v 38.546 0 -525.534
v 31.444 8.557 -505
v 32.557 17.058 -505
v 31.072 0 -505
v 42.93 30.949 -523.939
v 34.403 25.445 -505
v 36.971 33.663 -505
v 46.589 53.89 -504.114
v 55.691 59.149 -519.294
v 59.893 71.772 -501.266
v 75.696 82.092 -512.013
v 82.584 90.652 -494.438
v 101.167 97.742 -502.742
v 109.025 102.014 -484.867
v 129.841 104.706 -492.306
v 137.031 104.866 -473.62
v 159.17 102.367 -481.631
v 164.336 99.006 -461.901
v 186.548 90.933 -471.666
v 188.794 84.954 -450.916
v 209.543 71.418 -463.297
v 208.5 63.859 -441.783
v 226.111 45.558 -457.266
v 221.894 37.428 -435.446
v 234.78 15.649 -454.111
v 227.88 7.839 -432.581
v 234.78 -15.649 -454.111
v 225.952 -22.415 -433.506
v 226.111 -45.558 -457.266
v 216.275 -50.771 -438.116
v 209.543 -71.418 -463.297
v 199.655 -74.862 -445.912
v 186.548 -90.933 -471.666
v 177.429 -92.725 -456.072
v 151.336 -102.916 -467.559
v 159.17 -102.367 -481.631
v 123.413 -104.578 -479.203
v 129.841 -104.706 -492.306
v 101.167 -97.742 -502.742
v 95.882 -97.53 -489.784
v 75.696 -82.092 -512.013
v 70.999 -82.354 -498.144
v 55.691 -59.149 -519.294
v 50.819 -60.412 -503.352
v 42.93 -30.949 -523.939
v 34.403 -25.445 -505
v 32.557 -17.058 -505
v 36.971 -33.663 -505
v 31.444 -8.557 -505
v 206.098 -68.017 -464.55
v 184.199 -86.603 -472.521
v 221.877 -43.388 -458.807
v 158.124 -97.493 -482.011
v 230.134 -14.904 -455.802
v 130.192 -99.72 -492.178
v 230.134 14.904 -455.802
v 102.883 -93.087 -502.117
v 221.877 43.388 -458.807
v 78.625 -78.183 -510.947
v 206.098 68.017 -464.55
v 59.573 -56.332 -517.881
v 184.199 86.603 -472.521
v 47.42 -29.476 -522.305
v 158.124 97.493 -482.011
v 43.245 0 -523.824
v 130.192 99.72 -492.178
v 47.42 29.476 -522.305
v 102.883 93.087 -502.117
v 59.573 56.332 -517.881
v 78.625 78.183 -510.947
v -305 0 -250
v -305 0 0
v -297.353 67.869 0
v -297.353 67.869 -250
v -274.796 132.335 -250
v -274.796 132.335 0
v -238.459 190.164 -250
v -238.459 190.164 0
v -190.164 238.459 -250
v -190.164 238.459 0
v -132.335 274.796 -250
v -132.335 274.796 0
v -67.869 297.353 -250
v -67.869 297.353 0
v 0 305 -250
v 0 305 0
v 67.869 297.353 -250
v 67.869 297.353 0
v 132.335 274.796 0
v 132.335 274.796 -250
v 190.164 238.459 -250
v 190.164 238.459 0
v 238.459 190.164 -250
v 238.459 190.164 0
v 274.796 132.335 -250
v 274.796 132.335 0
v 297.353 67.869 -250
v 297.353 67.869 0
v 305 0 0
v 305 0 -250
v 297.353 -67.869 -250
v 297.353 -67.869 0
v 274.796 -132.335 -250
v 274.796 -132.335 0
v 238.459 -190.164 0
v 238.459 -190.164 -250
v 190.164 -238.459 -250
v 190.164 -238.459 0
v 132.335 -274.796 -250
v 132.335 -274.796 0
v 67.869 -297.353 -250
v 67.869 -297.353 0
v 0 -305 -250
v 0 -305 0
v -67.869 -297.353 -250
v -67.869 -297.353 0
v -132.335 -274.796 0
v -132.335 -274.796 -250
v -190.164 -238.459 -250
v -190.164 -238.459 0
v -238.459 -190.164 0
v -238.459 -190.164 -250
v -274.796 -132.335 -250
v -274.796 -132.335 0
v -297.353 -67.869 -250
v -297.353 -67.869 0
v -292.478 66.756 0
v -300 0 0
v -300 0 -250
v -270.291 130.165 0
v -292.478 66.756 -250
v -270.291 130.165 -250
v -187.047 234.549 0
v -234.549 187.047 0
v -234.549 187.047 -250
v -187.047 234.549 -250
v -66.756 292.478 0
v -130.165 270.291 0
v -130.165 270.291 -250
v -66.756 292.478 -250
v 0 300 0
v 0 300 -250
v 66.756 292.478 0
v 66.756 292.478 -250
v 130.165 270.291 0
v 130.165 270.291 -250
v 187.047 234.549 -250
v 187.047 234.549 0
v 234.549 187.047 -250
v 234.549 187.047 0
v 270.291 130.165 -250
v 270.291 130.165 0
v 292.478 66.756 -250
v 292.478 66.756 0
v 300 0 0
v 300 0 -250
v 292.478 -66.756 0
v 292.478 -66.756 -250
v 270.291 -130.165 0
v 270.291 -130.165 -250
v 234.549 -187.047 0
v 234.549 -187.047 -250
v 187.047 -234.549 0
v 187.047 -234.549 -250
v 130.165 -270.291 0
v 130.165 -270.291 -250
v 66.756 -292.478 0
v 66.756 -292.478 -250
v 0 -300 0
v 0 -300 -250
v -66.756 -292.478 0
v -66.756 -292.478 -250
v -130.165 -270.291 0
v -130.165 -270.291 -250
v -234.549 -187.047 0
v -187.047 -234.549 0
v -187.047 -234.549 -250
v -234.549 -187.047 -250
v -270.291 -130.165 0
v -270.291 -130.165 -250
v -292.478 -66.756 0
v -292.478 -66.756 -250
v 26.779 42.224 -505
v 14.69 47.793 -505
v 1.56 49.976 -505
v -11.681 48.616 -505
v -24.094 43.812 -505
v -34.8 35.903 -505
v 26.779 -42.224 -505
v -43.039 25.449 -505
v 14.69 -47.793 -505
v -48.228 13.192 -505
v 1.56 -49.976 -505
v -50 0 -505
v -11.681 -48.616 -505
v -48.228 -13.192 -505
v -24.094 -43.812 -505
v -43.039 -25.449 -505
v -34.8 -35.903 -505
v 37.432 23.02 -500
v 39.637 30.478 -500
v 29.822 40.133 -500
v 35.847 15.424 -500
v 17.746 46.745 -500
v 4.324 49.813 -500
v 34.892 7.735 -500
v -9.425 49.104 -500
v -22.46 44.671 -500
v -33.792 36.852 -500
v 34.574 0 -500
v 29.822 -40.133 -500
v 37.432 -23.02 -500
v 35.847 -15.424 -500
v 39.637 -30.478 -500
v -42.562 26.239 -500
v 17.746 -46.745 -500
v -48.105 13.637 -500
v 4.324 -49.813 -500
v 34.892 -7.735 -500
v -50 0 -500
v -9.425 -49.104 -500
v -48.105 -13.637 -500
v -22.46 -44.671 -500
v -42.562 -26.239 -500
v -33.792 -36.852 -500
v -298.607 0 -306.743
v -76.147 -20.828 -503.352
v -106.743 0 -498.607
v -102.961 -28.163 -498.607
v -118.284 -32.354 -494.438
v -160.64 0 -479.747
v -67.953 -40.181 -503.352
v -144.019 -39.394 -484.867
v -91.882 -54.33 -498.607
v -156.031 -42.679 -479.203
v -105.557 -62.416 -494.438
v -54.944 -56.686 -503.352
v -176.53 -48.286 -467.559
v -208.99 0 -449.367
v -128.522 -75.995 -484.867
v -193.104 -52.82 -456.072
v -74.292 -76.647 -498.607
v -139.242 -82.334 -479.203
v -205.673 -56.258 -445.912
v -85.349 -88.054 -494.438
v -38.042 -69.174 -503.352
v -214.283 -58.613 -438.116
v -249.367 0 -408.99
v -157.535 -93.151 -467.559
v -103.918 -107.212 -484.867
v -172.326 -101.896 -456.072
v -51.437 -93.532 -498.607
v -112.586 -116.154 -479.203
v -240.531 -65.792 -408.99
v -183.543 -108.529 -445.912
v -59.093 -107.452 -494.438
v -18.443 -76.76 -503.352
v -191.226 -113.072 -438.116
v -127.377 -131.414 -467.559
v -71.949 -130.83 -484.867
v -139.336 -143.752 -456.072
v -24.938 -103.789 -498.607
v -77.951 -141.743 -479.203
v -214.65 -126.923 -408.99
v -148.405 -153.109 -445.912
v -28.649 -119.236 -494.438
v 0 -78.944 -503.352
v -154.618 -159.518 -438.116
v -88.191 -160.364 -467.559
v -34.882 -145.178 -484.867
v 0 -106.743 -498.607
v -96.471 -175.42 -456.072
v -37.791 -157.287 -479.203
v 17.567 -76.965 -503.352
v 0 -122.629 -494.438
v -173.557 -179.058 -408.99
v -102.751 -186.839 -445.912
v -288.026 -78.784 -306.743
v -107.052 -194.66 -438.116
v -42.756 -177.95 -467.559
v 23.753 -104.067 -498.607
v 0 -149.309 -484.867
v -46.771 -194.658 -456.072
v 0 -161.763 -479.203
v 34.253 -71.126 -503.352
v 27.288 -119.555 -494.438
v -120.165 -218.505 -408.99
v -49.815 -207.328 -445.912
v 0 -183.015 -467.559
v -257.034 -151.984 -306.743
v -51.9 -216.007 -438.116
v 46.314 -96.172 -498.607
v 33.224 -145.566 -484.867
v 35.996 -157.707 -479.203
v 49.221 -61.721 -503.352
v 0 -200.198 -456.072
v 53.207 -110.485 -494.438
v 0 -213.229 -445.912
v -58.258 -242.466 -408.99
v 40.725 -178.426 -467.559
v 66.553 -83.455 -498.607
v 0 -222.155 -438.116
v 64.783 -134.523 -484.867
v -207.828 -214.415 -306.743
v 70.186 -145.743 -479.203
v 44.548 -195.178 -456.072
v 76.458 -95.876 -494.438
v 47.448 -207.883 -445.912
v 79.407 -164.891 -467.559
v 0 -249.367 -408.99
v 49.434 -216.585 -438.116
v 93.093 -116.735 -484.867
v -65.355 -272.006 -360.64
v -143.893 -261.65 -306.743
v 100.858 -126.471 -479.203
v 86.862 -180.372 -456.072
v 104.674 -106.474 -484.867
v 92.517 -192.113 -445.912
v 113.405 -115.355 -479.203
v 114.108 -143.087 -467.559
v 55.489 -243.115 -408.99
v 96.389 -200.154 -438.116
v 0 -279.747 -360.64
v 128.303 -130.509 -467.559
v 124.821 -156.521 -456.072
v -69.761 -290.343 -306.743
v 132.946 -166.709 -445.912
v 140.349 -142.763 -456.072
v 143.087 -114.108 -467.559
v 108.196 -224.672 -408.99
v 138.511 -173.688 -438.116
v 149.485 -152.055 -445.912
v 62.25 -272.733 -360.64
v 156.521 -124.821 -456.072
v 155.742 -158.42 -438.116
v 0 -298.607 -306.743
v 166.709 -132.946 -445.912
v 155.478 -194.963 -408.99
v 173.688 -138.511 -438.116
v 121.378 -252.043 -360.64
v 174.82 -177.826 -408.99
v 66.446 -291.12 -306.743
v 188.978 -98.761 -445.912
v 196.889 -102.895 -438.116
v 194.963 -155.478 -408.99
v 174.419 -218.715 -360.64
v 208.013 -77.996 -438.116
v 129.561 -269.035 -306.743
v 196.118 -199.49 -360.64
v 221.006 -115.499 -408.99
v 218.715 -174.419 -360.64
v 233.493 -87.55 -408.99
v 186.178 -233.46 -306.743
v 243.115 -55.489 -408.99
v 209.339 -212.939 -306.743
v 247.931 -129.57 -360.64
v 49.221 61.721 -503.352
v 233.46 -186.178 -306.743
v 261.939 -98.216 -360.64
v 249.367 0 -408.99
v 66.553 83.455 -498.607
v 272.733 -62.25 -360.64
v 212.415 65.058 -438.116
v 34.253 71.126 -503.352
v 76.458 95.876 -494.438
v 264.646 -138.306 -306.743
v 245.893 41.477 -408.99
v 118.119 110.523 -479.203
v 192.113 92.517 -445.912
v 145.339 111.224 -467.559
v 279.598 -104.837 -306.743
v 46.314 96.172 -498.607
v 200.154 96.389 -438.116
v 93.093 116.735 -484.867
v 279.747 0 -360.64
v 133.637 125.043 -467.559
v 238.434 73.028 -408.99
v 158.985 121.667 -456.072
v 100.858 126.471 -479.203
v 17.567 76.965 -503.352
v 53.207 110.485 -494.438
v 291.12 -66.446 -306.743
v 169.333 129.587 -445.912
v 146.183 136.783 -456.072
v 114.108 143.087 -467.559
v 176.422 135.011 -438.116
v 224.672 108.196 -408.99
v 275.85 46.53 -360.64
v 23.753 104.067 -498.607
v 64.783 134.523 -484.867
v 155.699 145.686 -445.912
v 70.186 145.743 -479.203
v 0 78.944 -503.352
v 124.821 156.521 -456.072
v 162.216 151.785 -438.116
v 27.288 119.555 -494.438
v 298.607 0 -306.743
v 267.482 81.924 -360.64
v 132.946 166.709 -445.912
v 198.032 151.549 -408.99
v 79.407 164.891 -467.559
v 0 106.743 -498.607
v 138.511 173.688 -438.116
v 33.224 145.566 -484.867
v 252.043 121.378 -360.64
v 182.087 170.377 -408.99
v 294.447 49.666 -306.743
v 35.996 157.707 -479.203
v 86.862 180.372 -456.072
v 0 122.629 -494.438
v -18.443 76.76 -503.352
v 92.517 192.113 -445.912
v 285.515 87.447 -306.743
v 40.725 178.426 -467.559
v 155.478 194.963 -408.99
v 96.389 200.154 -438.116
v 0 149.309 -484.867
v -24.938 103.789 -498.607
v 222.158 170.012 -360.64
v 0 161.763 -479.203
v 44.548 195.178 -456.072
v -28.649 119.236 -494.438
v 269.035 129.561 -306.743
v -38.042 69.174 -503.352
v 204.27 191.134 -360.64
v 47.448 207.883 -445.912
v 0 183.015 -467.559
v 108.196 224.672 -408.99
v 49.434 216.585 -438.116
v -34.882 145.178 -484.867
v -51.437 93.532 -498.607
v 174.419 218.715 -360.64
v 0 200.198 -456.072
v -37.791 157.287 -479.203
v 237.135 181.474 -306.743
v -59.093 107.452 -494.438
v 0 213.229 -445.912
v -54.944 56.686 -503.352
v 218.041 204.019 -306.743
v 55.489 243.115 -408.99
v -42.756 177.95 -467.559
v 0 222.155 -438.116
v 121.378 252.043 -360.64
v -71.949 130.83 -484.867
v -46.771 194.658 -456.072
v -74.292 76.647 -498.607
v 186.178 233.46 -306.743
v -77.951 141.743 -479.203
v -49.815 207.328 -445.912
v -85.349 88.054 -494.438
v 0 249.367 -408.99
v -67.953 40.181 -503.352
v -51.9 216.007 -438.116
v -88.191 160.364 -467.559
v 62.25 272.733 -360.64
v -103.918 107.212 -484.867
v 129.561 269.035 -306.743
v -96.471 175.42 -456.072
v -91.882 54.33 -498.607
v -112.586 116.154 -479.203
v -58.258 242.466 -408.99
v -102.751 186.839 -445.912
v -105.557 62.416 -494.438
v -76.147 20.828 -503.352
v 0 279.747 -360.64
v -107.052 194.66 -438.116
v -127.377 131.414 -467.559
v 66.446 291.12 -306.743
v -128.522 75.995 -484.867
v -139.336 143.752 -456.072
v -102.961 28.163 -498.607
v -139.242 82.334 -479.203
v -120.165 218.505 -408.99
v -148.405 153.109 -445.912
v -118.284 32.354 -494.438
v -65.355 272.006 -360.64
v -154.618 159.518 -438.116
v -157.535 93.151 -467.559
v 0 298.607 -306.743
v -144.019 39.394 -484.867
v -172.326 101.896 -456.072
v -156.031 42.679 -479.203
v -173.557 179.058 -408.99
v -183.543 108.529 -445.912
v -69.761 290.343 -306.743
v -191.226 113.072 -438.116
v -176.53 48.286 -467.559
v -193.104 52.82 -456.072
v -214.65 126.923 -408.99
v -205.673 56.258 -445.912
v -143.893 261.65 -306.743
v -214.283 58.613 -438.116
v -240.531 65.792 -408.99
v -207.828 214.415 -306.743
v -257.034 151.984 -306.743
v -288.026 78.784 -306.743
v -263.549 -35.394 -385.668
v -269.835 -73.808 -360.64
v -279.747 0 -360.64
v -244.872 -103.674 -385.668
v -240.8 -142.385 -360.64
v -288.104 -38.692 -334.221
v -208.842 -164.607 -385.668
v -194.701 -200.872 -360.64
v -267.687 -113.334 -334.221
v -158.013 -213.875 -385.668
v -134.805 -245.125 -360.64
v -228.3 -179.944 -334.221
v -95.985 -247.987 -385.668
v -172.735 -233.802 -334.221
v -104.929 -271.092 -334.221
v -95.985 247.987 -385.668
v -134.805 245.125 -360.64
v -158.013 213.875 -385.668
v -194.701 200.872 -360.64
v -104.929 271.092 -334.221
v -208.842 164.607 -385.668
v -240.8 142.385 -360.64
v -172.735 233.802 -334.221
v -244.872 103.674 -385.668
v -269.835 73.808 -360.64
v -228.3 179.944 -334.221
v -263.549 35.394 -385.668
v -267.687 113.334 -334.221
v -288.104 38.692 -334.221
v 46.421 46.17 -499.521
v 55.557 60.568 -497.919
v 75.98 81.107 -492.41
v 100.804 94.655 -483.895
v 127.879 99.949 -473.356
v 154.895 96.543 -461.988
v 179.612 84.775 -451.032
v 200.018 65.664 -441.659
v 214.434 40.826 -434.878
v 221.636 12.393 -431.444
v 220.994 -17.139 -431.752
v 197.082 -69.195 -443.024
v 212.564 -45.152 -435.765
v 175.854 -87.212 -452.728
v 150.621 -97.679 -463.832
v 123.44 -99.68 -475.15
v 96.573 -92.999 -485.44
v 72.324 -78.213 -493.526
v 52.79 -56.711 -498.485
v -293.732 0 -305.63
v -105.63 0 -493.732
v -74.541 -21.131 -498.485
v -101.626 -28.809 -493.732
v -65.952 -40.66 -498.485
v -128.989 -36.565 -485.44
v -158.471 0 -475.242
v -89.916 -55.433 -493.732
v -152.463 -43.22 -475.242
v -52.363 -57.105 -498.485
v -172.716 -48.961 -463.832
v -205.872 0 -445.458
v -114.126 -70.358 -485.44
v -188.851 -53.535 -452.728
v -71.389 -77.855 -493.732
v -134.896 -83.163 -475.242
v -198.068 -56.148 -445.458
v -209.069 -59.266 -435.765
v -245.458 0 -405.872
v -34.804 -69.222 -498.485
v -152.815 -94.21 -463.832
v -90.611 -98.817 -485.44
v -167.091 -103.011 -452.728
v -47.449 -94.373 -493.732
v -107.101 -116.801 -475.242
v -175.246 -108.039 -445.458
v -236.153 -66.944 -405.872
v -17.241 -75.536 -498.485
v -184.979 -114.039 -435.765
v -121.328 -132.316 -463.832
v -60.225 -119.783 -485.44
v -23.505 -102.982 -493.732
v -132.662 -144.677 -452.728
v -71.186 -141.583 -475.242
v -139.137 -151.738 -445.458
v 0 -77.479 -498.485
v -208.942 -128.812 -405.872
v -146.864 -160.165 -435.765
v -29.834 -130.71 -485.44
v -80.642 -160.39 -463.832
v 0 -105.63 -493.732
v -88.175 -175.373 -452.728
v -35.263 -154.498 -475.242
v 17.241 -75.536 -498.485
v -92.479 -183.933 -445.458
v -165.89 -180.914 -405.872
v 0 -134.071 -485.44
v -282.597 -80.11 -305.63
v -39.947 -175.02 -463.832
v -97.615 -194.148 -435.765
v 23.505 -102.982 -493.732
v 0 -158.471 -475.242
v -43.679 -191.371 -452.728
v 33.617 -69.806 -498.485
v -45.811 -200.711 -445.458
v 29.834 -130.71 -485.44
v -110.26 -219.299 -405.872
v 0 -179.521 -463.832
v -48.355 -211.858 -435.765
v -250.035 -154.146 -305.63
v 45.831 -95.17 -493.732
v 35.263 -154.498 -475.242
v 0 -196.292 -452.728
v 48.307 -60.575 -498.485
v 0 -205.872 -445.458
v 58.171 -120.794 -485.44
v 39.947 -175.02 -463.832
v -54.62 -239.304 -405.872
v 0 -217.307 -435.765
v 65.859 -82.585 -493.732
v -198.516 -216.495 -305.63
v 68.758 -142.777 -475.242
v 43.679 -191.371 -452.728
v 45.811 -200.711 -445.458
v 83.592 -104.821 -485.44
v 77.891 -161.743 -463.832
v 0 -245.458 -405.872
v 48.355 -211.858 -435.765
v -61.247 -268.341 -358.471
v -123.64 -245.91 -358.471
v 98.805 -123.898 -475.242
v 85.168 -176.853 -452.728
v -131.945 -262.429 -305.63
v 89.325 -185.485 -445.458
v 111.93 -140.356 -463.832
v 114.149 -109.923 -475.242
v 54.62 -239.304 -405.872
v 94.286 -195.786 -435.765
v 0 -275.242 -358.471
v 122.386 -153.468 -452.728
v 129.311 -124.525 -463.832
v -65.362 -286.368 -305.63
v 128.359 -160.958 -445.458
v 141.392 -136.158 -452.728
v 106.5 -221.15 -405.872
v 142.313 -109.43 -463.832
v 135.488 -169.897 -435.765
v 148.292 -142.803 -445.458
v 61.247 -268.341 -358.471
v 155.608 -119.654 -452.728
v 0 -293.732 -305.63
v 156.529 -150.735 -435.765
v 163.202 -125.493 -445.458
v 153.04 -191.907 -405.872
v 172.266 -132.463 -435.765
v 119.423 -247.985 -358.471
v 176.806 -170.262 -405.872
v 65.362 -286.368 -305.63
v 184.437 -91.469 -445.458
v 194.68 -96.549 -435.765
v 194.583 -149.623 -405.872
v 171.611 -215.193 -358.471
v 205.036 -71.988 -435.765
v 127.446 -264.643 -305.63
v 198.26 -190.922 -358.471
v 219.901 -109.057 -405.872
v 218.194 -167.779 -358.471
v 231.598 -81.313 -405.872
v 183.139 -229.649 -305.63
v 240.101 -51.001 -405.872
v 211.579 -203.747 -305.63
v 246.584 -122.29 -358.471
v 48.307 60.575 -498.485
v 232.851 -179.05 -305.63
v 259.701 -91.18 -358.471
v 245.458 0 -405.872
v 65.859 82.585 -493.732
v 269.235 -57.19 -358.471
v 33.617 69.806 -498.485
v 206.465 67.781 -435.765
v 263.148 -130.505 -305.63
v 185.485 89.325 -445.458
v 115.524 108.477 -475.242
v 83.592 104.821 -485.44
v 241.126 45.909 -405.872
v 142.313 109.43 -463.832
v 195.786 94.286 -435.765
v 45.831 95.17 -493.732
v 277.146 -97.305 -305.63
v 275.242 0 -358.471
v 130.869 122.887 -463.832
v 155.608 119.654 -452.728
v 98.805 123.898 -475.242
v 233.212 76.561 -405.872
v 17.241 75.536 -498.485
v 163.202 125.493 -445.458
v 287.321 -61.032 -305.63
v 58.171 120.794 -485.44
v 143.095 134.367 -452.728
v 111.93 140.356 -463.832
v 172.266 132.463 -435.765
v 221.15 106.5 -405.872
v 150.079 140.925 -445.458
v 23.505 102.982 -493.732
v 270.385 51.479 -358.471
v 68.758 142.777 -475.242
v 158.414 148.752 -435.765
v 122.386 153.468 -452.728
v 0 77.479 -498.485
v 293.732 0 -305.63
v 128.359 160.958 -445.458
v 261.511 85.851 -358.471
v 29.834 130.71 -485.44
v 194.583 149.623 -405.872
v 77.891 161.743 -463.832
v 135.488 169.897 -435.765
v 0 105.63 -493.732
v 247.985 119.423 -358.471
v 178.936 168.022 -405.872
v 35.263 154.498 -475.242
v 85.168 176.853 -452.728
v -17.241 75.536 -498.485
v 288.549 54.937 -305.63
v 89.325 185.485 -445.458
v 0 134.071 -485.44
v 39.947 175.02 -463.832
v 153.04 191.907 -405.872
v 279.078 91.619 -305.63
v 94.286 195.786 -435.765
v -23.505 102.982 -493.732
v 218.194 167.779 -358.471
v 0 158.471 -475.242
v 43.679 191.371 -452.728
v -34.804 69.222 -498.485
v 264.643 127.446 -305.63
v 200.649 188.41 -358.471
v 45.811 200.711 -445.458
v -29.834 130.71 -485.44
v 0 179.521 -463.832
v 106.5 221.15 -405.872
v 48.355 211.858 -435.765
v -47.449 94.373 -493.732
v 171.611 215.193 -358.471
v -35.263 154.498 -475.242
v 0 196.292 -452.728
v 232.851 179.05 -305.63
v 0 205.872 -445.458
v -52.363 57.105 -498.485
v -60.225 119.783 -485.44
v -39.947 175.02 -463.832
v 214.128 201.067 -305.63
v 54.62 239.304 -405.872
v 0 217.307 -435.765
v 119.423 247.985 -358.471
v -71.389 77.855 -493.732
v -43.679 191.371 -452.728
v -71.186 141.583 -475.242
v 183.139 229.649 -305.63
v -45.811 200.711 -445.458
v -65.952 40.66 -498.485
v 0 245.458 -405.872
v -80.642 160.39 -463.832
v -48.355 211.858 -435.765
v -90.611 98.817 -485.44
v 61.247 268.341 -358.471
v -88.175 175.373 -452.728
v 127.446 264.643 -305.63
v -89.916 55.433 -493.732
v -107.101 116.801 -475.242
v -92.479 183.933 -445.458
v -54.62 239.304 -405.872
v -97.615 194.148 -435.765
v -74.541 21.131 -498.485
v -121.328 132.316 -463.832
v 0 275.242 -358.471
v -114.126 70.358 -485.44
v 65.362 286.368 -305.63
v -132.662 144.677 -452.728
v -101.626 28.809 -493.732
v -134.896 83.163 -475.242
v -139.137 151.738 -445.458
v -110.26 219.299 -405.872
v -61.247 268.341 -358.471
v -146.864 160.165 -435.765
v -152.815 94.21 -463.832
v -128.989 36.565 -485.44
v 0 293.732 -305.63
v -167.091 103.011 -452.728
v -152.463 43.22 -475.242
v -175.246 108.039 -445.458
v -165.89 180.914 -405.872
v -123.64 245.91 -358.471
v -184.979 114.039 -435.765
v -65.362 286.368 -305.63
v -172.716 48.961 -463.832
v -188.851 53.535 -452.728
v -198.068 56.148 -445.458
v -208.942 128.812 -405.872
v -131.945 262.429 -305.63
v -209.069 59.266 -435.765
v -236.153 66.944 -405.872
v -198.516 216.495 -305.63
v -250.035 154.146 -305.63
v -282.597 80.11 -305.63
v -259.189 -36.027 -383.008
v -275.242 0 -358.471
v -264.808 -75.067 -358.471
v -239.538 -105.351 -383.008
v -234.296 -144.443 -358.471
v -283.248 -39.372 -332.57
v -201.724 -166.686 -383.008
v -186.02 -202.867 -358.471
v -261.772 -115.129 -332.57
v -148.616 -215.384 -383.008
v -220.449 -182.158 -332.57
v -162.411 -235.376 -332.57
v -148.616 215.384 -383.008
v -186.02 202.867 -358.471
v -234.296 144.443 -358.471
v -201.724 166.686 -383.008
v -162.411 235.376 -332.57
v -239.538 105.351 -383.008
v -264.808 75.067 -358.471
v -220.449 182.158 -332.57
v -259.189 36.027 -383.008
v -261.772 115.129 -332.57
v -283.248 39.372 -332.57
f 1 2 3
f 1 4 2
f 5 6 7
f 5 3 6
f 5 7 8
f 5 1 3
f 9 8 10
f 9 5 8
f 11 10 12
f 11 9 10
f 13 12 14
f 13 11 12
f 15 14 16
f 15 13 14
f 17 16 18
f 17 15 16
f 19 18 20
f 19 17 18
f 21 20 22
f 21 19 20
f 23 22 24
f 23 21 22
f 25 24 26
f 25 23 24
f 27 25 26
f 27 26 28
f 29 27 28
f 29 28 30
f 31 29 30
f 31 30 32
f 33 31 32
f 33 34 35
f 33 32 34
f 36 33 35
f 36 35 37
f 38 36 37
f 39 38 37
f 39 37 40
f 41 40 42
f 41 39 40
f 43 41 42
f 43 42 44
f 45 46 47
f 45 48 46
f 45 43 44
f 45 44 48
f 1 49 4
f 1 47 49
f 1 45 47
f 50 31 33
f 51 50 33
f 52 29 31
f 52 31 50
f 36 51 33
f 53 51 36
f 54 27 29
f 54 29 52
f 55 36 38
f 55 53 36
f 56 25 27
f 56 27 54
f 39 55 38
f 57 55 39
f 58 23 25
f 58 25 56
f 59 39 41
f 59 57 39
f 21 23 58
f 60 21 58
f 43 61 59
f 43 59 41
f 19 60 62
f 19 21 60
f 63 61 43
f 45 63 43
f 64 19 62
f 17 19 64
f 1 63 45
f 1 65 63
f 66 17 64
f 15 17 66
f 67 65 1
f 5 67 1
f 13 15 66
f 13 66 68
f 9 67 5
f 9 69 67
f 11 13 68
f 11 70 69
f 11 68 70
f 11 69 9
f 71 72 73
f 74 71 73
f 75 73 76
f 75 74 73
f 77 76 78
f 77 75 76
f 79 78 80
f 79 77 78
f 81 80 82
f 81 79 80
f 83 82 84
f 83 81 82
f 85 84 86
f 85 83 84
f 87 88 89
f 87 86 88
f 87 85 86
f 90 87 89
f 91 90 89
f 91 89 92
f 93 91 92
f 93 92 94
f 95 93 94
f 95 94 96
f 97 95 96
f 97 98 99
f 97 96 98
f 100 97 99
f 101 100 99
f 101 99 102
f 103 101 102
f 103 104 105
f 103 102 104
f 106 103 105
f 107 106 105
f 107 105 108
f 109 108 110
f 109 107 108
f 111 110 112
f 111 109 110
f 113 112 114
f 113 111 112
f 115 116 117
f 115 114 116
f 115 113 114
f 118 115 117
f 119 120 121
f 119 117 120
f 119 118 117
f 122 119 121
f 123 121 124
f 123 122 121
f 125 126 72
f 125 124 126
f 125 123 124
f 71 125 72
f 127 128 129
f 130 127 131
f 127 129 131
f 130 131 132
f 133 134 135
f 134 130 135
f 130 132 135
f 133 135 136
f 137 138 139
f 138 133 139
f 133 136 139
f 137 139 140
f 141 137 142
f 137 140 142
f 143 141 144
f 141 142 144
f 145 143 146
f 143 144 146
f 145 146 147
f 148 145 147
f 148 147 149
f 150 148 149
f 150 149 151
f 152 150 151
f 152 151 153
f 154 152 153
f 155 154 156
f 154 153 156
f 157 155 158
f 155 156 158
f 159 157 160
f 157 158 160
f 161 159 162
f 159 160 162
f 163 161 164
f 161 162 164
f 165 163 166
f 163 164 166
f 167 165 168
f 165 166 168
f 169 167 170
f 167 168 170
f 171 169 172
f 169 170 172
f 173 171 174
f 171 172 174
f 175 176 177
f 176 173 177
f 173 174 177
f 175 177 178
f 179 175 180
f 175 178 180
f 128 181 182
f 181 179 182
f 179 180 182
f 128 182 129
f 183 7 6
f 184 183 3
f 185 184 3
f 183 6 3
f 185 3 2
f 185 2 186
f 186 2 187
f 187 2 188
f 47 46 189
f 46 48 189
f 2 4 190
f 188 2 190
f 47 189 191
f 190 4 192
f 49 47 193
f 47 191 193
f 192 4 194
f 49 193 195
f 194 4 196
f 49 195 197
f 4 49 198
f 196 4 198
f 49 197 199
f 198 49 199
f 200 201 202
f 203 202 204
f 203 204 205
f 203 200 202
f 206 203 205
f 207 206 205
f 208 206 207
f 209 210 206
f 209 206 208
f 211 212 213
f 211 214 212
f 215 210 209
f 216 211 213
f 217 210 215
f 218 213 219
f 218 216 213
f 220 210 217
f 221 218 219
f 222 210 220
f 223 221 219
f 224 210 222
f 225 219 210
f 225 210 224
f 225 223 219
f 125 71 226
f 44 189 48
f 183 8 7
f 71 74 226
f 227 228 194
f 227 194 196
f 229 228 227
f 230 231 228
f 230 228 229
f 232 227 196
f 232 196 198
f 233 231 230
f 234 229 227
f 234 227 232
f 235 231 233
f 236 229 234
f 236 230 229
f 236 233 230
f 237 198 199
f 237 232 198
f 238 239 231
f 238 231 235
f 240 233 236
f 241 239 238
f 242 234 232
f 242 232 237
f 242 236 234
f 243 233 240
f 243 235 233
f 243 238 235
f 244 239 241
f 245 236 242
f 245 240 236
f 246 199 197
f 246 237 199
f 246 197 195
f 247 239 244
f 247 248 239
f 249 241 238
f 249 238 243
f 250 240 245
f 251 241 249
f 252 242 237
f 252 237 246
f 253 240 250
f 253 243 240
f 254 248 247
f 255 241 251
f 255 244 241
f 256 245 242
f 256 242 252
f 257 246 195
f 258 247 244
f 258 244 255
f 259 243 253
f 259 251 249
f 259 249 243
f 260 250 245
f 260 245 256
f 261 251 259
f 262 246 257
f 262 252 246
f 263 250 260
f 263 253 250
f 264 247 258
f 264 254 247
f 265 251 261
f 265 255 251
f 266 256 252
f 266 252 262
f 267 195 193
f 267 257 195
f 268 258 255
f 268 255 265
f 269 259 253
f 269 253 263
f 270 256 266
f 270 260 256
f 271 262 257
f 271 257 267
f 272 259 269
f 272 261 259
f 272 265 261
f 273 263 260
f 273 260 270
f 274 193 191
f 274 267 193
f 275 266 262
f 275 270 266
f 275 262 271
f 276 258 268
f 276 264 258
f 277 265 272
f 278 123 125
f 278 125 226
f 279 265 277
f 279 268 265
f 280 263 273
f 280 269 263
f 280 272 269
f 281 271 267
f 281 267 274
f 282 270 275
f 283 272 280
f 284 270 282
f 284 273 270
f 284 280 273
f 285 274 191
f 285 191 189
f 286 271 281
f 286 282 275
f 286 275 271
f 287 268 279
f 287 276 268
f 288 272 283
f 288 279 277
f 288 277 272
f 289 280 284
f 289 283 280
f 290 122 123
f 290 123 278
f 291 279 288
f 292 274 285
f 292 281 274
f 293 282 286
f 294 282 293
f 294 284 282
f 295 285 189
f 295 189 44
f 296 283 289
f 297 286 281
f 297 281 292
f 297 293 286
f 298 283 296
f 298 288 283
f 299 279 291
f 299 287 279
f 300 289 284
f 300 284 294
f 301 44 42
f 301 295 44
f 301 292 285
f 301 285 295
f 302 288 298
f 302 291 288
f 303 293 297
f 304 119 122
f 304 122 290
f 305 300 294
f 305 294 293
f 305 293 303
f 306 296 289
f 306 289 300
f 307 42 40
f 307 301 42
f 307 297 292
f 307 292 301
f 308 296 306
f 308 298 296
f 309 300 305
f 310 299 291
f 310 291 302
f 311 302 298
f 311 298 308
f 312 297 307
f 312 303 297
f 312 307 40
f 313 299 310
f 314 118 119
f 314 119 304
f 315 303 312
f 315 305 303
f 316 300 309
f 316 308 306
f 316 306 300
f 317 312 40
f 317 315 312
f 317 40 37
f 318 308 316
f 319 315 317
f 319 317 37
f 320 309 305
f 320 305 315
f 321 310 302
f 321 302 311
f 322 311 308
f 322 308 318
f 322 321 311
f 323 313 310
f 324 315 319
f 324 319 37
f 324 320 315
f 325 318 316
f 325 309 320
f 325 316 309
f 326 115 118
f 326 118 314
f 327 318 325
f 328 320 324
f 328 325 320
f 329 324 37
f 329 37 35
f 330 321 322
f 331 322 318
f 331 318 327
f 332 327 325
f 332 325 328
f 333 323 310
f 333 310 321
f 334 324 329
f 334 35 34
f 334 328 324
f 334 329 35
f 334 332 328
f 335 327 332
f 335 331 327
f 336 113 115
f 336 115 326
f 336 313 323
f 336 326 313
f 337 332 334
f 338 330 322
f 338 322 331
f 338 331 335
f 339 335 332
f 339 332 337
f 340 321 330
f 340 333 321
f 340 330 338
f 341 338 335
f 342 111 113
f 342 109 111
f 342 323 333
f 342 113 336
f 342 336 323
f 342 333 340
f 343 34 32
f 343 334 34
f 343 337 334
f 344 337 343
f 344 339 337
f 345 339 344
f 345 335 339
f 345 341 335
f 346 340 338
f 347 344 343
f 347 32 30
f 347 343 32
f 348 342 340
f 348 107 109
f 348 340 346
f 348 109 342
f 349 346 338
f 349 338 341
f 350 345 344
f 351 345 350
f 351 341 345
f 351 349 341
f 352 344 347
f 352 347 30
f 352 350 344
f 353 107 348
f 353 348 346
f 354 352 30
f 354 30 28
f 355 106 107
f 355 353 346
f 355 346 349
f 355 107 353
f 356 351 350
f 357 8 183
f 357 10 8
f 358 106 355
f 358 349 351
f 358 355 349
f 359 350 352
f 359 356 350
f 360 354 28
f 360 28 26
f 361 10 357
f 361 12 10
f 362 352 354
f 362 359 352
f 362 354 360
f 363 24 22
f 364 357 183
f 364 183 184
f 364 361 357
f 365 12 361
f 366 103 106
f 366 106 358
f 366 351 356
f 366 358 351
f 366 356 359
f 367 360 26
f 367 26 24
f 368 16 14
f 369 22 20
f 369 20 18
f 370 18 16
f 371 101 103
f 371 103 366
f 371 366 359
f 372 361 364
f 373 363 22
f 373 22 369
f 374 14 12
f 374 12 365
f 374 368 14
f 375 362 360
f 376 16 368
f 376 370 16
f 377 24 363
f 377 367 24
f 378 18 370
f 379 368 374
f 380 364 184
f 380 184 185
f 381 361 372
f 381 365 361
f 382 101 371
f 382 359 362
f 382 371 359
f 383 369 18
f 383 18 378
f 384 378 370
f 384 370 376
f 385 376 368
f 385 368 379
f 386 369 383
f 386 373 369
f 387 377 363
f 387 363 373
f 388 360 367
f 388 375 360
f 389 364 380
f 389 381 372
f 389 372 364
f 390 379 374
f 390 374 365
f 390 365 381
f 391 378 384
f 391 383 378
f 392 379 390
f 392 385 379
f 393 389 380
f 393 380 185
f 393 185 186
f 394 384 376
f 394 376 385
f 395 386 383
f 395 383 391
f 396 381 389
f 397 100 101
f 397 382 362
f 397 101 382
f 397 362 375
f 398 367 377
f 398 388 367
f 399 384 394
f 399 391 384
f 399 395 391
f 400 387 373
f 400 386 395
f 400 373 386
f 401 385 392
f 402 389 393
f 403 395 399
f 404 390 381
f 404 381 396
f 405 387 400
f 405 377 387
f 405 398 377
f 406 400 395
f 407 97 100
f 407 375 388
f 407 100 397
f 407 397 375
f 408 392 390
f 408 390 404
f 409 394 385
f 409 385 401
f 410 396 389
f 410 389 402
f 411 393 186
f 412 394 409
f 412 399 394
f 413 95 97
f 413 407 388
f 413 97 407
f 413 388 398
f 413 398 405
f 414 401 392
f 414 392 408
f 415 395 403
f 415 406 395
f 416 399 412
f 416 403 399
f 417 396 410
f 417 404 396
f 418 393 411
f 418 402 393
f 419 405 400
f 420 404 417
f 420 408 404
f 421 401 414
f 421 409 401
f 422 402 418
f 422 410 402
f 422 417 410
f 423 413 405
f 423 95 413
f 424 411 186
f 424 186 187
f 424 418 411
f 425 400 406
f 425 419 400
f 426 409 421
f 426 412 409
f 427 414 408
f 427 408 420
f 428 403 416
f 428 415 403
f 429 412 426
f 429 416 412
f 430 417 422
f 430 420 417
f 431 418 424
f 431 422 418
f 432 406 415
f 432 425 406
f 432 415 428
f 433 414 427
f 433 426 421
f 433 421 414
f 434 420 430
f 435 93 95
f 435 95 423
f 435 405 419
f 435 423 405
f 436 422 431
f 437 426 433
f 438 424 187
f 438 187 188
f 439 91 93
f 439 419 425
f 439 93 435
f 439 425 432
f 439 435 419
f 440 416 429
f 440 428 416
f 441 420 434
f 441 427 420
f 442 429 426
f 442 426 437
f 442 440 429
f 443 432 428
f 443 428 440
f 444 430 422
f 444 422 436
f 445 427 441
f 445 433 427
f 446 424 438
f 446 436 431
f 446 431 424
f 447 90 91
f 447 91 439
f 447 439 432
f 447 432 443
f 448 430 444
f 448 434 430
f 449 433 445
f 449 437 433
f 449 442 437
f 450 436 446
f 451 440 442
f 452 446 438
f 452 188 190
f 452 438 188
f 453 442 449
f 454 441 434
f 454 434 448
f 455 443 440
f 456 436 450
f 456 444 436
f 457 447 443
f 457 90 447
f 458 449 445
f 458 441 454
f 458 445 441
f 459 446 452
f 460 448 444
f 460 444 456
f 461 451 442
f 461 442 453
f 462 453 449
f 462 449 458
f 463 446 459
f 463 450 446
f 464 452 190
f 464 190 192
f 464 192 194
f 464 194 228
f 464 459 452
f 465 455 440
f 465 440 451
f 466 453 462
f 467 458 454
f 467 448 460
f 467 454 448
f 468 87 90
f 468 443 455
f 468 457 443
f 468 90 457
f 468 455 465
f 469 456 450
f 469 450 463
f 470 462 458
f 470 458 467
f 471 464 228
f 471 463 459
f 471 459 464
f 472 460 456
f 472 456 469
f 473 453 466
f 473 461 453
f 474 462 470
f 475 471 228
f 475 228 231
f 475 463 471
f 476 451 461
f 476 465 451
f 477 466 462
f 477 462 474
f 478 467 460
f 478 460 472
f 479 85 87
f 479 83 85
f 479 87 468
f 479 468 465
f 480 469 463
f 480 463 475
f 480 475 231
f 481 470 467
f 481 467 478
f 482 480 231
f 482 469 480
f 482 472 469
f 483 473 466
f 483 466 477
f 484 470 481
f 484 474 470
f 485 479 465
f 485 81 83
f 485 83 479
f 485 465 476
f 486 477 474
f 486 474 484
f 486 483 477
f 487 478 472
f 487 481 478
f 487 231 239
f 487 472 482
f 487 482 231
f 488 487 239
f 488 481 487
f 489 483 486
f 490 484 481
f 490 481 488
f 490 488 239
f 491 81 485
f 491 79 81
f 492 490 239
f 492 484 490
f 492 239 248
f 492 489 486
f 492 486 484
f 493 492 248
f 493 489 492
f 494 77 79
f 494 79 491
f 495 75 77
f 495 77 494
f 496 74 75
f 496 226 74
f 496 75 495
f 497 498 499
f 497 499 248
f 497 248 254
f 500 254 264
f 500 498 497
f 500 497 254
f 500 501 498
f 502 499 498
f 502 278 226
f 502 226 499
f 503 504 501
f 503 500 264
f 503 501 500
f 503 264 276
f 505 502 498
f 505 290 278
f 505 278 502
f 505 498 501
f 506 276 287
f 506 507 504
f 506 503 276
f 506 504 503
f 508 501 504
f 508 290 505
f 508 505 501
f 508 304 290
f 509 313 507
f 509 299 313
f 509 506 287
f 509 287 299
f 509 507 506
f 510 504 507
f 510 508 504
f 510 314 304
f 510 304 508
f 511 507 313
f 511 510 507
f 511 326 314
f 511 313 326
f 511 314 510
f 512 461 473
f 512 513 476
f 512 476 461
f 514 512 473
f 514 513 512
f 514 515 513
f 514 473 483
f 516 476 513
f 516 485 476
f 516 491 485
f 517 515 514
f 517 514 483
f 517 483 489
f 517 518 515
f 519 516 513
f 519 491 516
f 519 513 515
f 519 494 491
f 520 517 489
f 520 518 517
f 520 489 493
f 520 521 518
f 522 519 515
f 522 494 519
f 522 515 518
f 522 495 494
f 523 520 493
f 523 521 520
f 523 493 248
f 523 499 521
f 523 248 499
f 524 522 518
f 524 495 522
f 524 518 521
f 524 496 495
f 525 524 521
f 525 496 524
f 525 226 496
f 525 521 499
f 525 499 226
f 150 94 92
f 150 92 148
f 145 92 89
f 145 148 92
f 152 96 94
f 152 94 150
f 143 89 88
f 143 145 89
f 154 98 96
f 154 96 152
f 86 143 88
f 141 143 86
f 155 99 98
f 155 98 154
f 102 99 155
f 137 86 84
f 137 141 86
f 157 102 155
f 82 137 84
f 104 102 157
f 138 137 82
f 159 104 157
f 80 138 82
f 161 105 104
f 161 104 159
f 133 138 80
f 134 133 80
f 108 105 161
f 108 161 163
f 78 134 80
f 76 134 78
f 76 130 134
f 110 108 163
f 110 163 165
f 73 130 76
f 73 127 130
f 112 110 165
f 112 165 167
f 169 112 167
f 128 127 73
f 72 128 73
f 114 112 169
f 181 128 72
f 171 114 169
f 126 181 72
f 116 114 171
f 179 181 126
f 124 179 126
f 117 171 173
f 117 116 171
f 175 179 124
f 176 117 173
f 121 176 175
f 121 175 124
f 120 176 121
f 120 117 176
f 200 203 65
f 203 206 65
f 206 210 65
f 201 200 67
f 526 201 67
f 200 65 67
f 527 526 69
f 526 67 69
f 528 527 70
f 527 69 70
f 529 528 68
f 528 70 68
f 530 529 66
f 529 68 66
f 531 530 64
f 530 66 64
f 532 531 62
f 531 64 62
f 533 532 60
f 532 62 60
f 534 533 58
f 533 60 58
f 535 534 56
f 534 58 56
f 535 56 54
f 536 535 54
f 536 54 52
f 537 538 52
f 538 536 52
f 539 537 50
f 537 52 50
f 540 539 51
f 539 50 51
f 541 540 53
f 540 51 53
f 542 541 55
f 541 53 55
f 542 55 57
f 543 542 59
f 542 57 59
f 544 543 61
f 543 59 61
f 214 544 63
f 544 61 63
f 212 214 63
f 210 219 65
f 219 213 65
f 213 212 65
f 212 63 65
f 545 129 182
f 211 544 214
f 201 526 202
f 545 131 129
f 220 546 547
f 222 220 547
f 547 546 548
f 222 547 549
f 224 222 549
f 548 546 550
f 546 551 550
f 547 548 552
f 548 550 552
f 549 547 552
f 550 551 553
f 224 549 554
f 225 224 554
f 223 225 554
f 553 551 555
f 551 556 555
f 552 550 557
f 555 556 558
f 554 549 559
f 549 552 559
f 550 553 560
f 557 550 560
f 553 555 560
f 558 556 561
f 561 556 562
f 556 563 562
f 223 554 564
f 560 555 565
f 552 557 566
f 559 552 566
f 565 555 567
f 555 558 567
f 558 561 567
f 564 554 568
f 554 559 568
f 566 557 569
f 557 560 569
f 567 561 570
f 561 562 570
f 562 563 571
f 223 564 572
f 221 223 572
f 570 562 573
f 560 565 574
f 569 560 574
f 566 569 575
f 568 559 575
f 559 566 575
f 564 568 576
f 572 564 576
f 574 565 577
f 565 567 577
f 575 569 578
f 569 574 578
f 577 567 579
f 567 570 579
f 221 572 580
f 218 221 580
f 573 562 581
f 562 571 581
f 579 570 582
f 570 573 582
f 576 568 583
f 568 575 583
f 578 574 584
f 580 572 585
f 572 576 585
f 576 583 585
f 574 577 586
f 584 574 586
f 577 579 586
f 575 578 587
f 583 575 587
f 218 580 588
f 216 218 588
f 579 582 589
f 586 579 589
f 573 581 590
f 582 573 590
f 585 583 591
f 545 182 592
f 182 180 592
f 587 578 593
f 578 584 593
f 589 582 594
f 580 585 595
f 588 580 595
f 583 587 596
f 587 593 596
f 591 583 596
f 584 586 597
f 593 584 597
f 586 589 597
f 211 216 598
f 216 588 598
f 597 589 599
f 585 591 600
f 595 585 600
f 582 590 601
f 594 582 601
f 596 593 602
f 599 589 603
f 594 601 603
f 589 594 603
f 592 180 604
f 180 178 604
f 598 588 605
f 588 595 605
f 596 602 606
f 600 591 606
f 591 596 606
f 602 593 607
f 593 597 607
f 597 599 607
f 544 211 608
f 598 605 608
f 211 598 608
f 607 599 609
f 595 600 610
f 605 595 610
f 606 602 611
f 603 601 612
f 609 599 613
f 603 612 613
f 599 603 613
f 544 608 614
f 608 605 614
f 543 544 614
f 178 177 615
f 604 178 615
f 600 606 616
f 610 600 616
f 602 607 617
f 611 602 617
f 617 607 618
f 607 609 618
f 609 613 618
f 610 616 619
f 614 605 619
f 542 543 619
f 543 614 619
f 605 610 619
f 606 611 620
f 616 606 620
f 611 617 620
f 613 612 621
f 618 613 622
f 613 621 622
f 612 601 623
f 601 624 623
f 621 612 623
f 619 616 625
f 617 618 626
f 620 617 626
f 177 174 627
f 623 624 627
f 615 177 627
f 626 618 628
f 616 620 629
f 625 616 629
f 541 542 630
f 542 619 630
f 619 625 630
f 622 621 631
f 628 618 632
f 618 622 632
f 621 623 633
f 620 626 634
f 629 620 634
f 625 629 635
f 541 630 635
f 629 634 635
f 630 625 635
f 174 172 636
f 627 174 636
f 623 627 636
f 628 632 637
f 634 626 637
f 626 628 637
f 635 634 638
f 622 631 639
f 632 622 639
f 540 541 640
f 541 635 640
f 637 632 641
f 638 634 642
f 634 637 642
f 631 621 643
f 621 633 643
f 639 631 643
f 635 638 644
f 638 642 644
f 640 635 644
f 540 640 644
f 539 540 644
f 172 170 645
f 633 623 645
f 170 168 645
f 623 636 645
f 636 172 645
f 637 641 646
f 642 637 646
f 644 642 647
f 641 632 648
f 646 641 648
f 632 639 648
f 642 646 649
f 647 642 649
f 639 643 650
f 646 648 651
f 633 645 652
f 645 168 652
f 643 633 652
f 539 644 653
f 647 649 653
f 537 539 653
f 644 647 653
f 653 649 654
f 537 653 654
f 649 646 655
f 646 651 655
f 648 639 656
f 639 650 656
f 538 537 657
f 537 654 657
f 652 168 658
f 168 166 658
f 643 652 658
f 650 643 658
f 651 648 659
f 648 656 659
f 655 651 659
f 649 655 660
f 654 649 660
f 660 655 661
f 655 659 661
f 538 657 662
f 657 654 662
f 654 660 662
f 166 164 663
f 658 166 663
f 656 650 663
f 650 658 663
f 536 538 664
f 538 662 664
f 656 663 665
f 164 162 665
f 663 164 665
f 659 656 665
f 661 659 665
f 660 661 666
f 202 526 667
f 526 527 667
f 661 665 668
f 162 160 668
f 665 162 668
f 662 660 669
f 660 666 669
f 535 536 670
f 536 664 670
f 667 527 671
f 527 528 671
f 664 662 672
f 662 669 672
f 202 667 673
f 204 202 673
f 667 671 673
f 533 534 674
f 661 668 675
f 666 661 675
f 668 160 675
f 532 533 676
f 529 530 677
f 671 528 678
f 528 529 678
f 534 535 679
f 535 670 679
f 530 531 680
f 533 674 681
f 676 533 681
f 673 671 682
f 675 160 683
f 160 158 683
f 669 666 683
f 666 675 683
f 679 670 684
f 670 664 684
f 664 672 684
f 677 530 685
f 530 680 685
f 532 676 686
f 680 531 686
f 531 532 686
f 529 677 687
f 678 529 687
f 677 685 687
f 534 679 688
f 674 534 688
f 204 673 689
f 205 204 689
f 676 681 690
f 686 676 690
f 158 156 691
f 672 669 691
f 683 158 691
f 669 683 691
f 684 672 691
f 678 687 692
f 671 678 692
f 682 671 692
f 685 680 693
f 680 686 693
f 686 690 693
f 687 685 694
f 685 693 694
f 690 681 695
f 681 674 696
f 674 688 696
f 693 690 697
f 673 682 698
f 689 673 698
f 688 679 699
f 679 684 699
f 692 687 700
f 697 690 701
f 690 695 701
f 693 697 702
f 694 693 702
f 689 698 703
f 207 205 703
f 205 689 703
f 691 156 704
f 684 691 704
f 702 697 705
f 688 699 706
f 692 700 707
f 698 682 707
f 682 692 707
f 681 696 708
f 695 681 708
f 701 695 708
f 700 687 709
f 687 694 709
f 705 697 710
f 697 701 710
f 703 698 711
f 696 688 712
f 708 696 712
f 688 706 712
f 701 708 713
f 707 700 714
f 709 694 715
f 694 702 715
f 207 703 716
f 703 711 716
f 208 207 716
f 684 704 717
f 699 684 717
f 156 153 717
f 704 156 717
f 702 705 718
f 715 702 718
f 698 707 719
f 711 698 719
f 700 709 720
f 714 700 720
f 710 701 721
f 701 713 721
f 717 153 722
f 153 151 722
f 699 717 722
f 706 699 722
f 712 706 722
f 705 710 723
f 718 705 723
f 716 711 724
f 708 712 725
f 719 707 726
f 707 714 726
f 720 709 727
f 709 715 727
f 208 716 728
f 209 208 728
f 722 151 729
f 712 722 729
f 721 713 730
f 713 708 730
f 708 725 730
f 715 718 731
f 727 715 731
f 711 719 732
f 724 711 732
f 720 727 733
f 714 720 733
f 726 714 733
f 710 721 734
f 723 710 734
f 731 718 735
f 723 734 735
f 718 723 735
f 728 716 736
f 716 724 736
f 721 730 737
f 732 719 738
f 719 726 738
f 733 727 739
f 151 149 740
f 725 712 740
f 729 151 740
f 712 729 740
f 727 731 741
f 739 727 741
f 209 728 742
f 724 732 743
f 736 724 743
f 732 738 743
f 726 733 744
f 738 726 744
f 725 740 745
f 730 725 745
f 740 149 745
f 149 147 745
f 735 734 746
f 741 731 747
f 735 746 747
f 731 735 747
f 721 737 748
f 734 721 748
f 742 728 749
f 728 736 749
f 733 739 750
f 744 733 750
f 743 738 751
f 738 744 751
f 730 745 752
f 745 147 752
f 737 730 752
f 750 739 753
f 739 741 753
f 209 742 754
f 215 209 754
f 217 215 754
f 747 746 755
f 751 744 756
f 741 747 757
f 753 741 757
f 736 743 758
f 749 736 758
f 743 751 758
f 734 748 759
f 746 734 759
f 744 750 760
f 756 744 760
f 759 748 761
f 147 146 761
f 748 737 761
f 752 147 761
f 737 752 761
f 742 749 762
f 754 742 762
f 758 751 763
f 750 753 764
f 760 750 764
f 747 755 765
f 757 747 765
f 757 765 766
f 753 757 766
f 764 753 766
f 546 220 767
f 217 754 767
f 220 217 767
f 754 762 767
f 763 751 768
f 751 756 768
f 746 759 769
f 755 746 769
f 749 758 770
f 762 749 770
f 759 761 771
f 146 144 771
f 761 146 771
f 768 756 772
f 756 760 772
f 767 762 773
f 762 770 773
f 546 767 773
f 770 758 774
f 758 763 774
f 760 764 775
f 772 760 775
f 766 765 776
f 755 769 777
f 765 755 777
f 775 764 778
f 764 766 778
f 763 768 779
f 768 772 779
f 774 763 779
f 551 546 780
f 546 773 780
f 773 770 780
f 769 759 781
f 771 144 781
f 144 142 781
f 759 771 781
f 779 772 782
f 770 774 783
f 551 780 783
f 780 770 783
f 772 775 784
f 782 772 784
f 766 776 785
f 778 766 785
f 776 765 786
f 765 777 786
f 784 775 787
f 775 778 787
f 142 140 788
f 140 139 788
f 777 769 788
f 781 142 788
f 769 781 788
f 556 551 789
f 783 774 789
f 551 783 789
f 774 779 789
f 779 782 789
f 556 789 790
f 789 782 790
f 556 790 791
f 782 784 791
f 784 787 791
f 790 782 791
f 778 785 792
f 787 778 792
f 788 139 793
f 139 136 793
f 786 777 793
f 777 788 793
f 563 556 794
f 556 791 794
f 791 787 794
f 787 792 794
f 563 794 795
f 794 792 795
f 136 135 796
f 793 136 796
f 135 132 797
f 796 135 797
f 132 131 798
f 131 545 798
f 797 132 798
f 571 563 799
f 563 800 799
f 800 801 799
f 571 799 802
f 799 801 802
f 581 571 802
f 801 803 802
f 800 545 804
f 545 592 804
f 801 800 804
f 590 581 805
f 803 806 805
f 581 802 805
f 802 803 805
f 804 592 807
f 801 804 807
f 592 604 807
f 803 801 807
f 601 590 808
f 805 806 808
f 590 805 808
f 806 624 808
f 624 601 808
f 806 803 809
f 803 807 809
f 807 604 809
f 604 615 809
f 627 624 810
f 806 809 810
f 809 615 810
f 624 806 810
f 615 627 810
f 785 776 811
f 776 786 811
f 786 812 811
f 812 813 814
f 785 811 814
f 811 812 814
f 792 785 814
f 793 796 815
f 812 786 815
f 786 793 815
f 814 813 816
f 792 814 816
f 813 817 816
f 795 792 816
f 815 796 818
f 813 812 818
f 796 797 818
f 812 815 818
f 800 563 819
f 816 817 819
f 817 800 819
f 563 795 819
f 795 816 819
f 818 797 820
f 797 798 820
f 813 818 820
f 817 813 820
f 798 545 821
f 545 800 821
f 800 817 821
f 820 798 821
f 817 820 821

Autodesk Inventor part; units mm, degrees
ref_plane "YZ Plane" through (0, 0, 0) normal (1, 0, 0) x (0, 1, 0)
ref_plane "XZ Plane" through (0, 0, 0) normal (0, 1, 0) x (-1, 0, 0)
ref_plane "XY Plane" through (0, 0, 0) normal (0, 0, 1) x (1, 0, 0)
sketch "Skizze1" plane through (0, 0, 0) normal (0, 1, 0) x (-1, 0, 0)
  line L0 (0, -493.487354) -> (0, 702.145893)
  line L1 (0, -500) -> (50, -500)
  line L2 (300, 0) -> (300, -250)
  arc A0 (50, -500) -> (300, -250) centre (50, -250) ccw
  line L3 (300, 0) -> (305, 0)
  line L4 (305, 0) -> (305, -250)
  line L5 (0, -500) -> (0, -505)
  line L6 (0, -505) -> (50, -505)
  arc A1 (50, -505) -> (305, -250) centre (50, -250) ccw
  point P0 (0, 0)
  dimension "d0" = 0
  dimension "d1" = 600
  dimension "d2" = 50
  dimension "d3" = 500
  dimension "d4" = 5
  dimension "d5" = 5
  dimension "d6" = 50
revolve "Umdrehung1" add sketch "Skizze1" angle 360 about axis through (0, 0, -493.487354) along (0, 0, 1)
sketch "Skizze2" plane through (0, 0, 0) normal (0, 1, 0) x (-1, 0, 0)
  line L0 (-305, -250) -> (305, -250)
  line L1 (-50, -505) -> (50, -505)
  arc A0 (-305, -250) -> (-50, -505) centre (-50, -250) ccw
  line L2 (-101.948734, -499.652416) -> (-102.850213, -502.129245)
  line L3 (-102.850213, -502.129245) -> (-187.422693, -471.347829)
  line L4 (-187.422693, -471.347829) -> (-185.486683, -466.028607)
  point P0 (0, 0)
  point P1 (-137.214011, -489.622028)
  dimension "d8" = 90
extrude "Extrusion1" add sketch "Skizze2" along normal blind 10
sketch "Skizze3" plane through (137.214011, 0, -489.622028) normal (0.3420157, 0, -0.9396942) x (-0.9396942, 0, -0.3420157)
  line L0 (-53.430873, 0) -> (0, 0)
  circle A0 centre (0, 0) radius 105
  point P0 (-38.519221, 0)
  dimension "d12" = 210
extrude "Extrusion2" add sketch "Skizze3" against normal up to surface
sketch "Skizze4" plane through (137.214011, 0, -489.622028) normal (0.3420157, 0, -0.9396942) x (-0.9396942, 0, -0.3420157)
  circle A0 centre (0, 0) radius 100
  point P0 (-38.519221, 0)
  dimension "d15" = 200
extrude "Extrusion3" cut sketch "Skizze4" against normal through all
equation "\"d5\" = d4"
equation "\"d6\" = d2"
properties part number "Tank_3"
